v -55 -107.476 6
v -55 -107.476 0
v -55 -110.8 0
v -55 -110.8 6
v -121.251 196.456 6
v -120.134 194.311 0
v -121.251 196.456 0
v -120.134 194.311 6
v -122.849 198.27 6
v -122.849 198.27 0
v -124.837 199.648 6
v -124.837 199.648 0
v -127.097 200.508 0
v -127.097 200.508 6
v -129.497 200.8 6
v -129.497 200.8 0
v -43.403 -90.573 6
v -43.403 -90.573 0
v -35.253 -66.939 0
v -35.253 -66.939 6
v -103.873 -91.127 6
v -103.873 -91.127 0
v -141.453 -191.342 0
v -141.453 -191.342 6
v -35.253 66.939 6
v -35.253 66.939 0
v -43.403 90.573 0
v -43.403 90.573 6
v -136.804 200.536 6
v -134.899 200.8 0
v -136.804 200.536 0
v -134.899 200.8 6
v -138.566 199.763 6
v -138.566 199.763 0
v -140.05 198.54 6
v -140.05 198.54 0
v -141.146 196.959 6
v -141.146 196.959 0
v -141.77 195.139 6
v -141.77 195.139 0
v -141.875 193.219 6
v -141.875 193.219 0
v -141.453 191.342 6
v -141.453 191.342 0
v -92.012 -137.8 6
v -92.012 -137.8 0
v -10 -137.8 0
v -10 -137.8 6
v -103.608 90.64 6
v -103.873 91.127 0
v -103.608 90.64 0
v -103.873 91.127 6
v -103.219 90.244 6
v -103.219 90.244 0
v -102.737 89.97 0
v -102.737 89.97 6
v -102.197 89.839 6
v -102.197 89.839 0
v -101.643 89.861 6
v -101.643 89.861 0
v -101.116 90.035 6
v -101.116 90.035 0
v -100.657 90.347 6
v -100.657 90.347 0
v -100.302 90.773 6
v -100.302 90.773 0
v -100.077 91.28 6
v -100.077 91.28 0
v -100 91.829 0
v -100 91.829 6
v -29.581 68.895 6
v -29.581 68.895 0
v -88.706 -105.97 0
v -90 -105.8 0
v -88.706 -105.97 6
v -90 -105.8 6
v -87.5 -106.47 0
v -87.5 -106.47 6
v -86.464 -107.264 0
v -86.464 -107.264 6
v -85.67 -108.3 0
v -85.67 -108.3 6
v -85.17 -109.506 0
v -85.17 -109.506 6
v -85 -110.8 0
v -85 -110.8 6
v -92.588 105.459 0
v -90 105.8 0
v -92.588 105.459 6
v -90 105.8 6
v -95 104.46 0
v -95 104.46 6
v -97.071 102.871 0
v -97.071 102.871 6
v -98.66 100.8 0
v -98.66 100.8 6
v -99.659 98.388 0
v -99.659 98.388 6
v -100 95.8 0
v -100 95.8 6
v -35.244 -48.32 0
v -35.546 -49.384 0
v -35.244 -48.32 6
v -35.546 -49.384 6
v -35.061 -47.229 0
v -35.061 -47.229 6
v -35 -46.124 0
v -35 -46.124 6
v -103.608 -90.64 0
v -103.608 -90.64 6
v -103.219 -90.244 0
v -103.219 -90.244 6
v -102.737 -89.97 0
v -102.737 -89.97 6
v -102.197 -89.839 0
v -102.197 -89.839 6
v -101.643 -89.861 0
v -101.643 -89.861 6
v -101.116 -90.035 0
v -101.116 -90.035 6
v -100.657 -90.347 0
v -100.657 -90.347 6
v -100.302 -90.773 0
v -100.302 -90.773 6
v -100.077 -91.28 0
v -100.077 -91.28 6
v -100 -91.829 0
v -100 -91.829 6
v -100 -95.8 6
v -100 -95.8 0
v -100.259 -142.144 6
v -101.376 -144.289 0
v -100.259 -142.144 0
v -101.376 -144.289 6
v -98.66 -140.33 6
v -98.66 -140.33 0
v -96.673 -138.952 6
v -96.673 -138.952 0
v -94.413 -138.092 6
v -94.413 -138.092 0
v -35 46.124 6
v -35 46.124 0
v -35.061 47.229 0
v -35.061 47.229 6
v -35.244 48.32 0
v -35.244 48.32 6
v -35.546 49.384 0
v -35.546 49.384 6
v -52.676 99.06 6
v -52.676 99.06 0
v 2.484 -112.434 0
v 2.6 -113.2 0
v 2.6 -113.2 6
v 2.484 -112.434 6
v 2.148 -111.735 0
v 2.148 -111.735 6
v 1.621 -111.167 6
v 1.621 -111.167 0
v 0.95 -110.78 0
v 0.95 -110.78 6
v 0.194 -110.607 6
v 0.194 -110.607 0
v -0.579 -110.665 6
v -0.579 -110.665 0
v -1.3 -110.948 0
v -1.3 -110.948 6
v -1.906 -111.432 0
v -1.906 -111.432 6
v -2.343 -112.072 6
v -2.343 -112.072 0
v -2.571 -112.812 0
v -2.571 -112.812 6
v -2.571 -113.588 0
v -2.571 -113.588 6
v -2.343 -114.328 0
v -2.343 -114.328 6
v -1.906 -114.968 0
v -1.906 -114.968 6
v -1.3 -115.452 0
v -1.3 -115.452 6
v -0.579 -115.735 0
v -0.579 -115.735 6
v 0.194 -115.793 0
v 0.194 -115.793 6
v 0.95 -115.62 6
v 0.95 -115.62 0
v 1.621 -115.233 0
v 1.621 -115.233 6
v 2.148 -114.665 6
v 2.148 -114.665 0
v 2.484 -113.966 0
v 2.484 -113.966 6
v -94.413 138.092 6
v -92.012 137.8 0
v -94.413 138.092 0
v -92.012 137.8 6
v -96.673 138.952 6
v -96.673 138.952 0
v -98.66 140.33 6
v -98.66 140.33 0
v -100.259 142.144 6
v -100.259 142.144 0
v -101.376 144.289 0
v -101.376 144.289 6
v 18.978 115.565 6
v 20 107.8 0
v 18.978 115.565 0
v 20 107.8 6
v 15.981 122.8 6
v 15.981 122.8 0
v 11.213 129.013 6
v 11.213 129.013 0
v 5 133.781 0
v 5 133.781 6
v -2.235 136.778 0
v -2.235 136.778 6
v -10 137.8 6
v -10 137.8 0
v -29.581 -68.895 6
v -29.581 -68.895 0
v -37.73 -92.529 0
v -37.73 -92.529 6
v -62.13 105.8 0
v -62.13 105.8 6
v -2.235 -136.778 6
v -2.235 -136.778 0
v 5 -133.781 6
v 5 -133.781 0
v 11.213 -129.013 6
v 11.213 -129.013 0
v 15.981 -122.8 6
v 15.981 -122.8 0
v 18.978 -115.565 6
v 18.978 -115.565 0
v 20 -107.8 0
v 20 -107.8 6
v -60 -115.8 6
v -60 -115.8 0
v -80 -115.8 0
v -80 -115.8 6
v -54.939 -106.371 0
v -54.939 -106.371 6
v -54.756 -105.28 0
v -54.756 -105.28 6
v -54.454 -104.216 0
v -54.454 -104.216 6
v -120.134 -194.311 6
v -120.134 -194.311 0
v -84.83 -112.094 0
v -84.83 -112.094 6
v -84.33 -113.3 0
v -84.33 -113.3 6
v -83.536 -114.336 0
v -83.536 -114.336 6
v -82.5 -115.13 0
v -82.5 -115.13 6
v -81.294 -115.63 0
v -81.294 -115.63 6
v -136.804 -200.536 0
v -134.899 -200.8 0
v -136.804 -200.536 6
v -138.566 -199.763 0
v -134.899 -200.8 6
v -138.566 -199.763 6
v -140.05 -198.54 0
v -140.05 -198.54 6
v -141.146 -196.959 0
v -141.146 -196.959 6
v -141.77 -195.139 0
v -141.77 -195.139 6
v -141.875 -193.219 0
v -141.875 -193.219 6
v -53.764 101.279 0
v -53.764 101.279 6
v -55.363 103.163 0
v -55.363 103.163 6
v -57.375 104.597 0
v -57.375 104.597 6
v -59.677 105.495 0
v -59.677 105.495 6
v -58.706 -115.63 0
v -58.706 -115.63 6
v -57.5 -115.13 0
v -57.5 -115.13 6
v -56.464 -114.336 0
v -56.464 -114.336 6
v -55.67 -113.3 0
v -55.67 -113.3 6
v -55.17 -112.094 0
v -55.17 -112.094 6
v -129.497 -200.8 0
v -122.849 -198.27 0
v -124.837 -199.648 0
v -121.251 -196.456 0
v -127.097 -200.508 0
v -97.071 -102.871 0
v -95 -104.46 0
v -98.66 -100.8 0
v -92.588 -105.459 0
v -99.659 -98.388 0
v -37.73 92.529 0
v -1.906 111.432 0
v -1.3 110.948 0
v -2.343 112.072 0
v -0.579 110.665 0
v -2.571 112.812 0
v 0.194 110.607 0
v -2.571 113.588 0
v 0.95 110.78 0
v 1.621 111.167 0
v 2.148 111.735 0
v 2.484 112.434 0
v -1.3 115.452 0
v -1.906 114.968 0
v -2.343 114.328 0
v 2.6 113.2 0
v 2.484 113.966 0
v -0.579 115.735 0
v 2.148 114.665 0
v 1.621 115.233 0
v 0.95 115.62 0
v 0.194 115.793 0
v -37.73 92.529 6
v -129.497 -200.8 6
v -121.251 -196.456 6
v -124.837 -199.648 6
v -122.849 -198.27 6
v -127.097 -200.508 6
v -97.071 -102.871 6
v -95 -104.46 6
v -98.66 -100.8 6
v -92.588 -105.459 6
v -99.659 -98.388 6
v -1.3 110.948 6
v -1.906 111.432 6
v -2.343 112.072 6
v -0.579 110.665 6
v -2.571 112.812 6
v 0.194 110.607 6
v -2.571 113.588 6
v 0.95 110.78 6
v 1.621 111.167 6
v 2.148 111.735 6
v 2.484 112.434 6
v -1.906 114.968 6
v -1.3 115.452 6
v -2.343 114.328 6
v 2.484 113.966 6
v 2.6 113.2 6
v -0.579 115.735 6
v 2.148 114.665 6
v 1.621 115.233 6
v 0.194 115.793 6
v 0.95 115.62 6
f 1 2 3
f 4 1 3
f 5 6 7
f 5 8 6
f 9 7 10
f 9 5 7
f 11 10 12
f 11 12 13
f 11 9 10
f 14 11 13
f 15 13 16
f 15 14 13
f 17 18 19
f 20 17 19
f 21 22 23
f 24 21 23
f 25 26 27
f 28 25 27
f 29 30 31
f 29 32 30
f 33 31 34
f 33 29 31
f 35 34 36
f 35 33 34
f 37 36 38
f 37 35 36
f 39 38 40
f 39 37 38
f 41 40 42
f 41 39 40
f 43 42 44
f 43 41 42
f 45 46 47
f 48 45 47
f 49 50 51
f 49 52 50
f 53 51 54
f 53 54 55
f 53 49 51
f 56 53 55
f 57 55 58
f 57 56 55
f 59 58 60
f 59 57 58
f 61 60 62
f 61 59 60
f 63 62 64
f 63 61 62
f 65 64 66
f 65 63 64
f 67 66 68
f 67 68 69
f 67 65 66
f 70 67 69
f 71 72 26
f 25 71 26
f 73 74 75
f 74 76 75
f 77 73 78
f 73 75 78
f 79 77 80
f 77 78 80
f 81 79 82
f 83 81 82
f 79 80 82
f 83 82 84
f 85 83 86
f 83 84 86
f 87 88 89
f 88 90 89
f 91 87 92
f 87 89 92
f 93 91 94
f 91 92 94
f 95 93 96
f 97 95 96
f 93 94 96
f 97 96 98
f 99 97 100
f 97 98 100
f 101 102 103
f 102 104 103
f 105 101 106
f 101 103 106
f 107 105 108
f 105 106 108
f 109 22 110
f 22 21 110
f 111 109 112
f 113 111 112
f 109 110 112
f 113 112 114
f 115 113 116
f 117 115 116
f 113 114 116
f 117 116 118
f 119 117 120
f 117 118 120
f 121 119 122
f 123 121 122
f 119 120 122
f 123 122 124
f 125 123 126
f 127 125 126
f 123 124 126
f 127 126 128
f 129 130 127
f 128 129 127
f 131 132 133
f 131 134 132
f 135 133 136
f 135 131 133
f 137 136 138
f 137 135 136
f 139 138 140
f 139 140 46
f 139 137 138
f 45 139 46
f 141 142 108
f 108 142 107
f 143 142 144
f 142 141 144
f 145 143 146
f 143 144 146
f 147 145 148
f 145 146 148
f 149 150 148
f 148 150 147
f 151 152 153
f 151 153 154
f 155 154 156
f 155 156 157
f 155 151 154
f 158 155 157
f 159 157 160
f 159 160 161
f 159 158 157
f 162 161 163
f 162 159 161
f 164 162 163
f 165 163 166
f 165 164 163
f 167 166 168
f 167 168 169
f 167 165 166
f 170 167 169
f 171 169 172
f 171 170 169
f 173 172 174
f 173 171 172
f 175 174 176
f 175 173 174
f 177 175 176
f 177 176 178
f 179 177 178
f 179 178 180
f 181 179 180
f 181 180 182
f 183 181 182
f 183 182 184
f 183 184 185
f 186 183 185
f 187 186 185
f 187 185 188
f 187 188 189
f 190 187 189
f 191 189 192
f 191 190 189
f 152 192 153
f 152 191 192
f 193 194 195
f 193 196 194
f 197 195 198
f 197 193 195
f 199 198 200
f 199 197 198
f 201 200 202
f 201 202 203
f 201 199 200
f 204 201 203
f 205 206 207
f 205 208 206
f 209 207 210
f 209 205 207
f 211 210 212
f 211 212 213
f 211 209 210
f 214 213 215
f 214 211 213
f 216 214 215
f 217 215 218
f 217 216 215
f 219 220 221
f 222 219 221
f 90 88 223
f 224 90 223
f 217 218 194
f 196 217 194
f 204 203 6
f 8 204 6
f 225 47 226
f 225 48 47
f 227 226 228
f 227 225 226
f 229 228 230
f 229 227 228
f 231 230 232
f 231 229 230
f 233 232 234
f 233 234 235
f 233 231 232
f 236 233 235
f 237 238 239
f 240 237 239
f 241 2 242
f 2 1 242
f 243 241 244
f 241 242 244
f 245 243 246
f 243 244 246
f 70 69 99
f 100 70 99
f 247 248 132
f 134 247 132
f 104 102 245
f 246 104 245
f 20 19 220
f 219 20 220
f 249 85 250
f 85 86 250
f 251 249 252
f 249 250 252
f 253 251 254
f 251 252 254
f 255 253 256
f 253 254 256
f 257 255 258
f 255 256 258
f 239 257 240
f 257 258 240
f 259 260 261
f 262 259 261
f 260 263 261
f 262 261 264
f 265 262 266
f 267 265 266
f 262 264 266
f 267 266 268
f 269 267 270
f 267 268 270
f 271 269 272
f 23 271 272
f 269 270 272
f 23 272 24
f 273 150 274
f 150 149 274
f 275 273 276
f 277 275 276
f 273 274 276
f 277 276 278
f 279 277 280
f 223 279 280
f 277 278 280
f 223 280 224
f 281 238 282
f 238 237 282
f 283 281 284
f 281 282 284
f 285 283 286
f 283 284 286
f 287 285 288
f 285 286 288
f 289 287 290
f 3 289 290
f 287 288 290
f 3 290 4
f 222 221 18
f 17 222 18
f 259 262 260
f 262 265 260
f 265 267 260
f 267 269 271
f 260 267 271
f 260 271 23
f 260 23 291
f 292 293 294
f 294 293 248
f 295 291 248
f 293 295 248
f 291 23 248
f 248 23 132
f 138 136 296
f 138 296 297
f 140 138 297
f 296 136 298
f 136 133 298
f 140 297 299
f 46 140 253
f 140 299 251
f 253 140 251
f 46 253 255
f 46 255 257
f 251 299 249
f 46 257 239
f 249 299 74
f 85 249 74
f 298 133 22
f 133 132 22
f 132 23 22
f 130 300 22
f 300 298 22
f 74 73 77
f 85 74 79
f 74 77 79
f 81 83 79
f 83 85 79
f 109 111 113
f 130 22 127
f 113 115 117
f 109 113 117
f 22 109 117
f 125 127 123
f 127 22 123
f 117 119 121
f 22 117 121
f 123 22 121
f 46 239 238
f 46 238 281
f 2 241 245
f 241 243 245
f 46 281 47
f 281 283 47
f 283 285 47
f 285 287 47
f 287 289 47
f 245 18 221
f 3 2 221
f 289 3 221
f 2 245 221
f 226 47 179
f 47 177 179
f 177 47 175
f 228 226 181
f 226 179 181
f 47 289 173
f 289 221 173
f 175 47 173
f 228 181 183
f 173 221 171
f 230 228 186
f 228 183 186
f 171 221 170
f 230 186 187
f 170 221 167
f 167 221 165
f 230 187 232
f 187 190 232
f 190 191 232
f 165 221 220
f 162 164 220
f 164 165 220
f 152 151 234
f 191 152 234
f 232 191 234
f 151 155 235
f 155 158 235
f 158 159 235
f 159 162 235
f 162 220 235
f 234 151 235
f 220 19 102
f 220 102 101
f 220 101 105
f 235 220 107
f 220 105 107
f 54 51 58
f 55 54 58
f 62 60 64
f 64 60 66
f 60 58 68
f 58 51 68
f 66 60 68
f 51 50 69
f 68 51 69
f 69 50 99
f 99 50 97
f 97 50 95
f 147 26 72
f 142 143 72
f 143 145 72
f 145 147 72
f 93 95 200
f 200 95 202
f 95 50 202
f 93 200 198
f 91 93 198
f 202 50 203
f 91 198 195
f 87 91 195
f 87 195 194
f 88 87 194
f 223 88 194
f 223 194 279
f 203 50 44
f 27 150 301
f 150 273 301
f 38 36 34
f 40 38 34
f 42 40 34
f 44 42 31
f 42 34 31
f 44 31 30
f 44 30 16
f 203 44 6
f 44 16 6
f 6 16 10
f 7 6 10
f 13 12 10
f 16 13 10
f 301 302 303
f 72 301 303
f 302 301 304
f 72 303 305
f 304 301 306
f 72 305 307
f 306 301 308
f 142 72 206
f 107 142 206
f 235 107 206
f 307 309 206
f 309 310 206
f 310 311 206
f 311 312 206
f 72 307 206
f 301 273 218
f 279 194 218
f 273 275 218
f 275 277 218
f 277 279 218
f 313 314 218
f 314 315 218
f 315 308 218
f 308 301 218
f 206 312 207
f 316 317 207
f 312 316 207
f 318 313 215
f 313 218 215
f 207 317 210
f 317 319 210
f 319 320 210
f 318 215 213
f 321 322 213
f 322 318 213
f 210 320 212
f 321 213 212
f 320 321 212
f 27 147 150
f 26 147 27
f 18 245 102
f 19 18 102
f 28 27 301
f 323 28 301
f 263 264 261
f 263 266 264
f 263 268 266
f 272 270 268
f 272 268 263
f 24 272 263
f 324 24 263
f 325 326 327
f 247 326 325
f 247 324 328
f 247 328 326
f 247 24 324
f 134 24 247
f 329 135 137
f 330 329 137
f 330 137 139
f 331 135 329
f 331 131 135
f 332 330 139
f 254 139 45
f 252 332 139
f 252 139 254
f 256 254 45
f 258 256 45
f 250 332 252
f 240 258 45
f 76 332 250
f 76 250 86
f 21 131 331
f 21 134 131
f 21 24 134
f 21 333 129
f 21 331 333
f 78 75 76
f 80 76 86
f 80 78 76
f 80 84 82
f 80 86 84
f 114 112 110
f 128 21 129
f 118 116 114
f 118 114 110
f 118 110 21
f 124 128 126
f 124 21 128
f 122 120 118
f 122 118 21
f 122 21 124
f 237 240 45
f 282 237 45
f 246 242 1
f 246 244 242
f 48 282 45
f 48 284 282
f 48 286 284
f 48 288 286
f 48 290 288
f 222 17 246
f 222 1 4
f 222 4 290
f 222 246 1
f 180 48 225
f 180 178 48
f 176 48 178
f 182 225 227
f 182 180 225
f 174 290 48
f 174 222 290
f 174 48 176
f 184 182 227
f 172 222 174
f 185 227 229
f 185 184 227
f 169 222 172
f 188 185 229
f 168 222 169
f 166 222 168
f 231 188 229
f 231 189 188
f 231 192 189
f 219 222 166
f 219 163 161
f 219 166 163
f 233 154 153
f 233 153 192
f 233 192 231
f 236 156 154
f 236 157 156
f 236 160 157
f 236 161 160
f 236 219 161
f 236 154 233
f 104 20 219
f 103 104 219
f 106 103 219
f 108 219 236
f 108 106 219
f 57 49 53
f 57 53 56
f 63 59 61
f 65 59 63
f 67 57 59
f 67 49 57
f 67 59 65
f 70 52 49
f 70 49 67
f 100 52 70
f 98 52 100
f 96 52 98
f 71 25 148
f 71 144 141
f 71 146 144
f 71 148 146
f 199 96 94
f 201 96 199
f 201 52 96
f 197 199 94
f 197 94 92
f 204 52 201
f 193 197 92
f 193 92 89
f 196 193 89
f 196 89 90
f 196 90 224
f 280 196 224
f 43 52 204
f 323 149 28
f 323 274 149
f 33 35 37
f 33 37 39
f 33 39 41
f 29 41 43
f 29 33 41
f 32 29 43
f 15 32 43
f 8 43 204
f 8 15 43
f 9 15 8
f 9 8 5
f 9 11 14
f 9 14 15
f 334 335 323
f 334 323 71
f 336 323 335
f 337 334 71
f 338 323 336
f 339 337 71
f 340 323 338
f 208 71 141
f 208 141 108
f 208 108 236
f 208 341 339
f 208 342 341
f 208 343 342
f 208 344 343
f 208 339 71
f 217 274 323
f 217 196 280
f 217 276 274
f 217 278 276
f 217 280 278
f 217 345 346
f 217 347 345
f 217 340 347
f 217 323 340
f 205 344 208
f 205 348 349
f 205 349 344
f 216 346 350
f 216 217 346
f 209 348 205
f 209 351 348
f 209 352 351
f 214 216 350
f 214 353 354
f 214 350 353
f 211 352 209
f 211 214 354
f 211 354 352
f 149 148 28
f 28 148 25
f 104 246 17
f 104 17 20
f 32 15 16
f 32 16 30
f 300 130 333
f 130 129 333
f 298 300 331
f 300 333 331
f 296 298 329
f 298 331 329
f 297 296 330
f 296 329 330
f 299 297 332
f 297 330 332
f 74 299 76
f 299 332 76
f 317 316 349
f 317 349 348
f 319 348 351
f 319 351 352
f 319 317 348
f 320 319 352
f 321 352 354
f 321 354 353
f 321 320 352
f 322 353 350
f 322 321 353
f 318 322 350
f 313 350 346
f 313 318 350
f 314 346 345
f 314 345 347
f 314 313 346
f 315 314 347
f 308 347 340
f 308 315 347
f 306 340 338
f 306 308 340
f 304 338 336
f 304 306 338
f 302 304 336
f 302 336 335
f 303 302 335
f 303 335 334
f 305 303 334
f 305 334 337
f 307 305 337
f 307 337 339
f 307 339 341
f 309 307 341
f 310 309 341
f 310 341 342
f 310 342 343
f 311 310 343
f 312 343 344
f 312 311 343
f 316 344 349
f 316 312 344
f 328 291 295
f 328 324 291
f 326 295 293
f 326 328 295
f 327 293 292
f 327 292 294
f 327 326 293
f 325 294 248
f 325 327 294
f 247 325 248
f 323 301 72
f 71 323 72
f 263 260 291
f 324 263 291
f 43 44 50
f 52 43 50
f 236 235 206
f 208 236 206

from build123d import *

# Parameters (mm, degrees)
ESBO_O1_R                = 2.6
RESSALTO_EXTRUS_O1_DEPTH = 6
FILETE1_R                = 2
FILETE3_R                = 10
FILETE4_R                = 7
FILETE5_R                = 5
FILETE6_R                = 30


with BuildPart() as part:
    # Esboço1 → Ressalto-extrusão1 (new body)
    with BuildSketch(Plane.XY):
        Polygon((-98.942383725, -137.8), (20, -137.8), (20, 137.8), (-98.942383725, 137.8), (-122.567383725, 200.8), (-145, 200.8), (-100, 80.8), (-100, 105.8), (-55, 105.8), (-35, 47.8), (-35, -47.8), (-55, -105.8), (-55, -115.8), (-85, -115.8), (-85, -105.8), (-100, -105.8), (-100, -80.8), (-145, -200.8), (-122.567383725, -200.8), align=None)
        Polygon((-35.252878569, -66.93878183), (-29.580640679, -68.89472593), (-37.730407762, -92.52905047), (-43.402645652, -90.57310637), align=None, mode=Mode.SUBTRACT)
        Polygon((-43.402645652, 90.57310637), (-37.730407762, 92.52905047), (-29.580640679, 68.89472593), (-35.252878569, 66.93878183), align=None, mode=Mode.SUBTRACT)
        with Locations((0, 113.2)):
            Circle(ESBO_O1_R, mode=Mode.SUBTRACT)
        with Locations((0, -113.2)):
            Circle(ESBO_O1_R, mode=Mode.SUBTRACT)
    extrude(amount=RESSALTO_EXTRUS_O1_DEPTH)

    # Filete1
    filete1_edges = [part.edges().sort_by_distance(p)[0] for p in [
        (-100, -80.8, 3),
        (-100, 80.8, 3),
    ]]
    fillet(filete1_edges, radius=FILETE1_R)

    # Filete3
    filete3_edges = [part.edges().sort_by_distance(p)[0] for p in [
        (-98.942383725, -137.8, 3),
        (-122.567383725, -200.8, 3),
        (-100, -105.8, 3),
        (-55, -105.8, 3),
        (-35, -47.8, 3),
        (-35, 47.8, 3),
        (-55, 105.8, 3),
        (-100, 105.8, 3),
        (-122.567383725, 200.8, 3),
        (-98.942383725, 137.8, 3),
    ]]
    fillet(filete3_edges, radius=FILETE3_R)

    # Filete4
    filete4_edges = [part.edges().sort_by_distance(p)[0] for p in [
        (-145, -200.8, 3),
        (-145, 200.8, 3),
    ]]
    fillet(filete4_edges, radius=FILETE4_R)

    # Filete5
    filete5_edges = [part.edges().sort_by_distance(p)[0] for p in [
        (-85, -115.8, 3),
        (-55, -115.8, 3),
        (-85, -105.8, 3),
    ]]
    fillet(filete5_edges, radius=FILETE5_R - 0.0001)  # a hair under: the kernel refuses the full size

    # Filete6
    filete6_edges = [part.edges().sort_by_distance(p)[0] for p in [
        (20, 137.8, 3),
        (20, -137.8, 3),
    ]]
    fillet(filete6_edges, radius=FILETE6_R)


solid = part.part
